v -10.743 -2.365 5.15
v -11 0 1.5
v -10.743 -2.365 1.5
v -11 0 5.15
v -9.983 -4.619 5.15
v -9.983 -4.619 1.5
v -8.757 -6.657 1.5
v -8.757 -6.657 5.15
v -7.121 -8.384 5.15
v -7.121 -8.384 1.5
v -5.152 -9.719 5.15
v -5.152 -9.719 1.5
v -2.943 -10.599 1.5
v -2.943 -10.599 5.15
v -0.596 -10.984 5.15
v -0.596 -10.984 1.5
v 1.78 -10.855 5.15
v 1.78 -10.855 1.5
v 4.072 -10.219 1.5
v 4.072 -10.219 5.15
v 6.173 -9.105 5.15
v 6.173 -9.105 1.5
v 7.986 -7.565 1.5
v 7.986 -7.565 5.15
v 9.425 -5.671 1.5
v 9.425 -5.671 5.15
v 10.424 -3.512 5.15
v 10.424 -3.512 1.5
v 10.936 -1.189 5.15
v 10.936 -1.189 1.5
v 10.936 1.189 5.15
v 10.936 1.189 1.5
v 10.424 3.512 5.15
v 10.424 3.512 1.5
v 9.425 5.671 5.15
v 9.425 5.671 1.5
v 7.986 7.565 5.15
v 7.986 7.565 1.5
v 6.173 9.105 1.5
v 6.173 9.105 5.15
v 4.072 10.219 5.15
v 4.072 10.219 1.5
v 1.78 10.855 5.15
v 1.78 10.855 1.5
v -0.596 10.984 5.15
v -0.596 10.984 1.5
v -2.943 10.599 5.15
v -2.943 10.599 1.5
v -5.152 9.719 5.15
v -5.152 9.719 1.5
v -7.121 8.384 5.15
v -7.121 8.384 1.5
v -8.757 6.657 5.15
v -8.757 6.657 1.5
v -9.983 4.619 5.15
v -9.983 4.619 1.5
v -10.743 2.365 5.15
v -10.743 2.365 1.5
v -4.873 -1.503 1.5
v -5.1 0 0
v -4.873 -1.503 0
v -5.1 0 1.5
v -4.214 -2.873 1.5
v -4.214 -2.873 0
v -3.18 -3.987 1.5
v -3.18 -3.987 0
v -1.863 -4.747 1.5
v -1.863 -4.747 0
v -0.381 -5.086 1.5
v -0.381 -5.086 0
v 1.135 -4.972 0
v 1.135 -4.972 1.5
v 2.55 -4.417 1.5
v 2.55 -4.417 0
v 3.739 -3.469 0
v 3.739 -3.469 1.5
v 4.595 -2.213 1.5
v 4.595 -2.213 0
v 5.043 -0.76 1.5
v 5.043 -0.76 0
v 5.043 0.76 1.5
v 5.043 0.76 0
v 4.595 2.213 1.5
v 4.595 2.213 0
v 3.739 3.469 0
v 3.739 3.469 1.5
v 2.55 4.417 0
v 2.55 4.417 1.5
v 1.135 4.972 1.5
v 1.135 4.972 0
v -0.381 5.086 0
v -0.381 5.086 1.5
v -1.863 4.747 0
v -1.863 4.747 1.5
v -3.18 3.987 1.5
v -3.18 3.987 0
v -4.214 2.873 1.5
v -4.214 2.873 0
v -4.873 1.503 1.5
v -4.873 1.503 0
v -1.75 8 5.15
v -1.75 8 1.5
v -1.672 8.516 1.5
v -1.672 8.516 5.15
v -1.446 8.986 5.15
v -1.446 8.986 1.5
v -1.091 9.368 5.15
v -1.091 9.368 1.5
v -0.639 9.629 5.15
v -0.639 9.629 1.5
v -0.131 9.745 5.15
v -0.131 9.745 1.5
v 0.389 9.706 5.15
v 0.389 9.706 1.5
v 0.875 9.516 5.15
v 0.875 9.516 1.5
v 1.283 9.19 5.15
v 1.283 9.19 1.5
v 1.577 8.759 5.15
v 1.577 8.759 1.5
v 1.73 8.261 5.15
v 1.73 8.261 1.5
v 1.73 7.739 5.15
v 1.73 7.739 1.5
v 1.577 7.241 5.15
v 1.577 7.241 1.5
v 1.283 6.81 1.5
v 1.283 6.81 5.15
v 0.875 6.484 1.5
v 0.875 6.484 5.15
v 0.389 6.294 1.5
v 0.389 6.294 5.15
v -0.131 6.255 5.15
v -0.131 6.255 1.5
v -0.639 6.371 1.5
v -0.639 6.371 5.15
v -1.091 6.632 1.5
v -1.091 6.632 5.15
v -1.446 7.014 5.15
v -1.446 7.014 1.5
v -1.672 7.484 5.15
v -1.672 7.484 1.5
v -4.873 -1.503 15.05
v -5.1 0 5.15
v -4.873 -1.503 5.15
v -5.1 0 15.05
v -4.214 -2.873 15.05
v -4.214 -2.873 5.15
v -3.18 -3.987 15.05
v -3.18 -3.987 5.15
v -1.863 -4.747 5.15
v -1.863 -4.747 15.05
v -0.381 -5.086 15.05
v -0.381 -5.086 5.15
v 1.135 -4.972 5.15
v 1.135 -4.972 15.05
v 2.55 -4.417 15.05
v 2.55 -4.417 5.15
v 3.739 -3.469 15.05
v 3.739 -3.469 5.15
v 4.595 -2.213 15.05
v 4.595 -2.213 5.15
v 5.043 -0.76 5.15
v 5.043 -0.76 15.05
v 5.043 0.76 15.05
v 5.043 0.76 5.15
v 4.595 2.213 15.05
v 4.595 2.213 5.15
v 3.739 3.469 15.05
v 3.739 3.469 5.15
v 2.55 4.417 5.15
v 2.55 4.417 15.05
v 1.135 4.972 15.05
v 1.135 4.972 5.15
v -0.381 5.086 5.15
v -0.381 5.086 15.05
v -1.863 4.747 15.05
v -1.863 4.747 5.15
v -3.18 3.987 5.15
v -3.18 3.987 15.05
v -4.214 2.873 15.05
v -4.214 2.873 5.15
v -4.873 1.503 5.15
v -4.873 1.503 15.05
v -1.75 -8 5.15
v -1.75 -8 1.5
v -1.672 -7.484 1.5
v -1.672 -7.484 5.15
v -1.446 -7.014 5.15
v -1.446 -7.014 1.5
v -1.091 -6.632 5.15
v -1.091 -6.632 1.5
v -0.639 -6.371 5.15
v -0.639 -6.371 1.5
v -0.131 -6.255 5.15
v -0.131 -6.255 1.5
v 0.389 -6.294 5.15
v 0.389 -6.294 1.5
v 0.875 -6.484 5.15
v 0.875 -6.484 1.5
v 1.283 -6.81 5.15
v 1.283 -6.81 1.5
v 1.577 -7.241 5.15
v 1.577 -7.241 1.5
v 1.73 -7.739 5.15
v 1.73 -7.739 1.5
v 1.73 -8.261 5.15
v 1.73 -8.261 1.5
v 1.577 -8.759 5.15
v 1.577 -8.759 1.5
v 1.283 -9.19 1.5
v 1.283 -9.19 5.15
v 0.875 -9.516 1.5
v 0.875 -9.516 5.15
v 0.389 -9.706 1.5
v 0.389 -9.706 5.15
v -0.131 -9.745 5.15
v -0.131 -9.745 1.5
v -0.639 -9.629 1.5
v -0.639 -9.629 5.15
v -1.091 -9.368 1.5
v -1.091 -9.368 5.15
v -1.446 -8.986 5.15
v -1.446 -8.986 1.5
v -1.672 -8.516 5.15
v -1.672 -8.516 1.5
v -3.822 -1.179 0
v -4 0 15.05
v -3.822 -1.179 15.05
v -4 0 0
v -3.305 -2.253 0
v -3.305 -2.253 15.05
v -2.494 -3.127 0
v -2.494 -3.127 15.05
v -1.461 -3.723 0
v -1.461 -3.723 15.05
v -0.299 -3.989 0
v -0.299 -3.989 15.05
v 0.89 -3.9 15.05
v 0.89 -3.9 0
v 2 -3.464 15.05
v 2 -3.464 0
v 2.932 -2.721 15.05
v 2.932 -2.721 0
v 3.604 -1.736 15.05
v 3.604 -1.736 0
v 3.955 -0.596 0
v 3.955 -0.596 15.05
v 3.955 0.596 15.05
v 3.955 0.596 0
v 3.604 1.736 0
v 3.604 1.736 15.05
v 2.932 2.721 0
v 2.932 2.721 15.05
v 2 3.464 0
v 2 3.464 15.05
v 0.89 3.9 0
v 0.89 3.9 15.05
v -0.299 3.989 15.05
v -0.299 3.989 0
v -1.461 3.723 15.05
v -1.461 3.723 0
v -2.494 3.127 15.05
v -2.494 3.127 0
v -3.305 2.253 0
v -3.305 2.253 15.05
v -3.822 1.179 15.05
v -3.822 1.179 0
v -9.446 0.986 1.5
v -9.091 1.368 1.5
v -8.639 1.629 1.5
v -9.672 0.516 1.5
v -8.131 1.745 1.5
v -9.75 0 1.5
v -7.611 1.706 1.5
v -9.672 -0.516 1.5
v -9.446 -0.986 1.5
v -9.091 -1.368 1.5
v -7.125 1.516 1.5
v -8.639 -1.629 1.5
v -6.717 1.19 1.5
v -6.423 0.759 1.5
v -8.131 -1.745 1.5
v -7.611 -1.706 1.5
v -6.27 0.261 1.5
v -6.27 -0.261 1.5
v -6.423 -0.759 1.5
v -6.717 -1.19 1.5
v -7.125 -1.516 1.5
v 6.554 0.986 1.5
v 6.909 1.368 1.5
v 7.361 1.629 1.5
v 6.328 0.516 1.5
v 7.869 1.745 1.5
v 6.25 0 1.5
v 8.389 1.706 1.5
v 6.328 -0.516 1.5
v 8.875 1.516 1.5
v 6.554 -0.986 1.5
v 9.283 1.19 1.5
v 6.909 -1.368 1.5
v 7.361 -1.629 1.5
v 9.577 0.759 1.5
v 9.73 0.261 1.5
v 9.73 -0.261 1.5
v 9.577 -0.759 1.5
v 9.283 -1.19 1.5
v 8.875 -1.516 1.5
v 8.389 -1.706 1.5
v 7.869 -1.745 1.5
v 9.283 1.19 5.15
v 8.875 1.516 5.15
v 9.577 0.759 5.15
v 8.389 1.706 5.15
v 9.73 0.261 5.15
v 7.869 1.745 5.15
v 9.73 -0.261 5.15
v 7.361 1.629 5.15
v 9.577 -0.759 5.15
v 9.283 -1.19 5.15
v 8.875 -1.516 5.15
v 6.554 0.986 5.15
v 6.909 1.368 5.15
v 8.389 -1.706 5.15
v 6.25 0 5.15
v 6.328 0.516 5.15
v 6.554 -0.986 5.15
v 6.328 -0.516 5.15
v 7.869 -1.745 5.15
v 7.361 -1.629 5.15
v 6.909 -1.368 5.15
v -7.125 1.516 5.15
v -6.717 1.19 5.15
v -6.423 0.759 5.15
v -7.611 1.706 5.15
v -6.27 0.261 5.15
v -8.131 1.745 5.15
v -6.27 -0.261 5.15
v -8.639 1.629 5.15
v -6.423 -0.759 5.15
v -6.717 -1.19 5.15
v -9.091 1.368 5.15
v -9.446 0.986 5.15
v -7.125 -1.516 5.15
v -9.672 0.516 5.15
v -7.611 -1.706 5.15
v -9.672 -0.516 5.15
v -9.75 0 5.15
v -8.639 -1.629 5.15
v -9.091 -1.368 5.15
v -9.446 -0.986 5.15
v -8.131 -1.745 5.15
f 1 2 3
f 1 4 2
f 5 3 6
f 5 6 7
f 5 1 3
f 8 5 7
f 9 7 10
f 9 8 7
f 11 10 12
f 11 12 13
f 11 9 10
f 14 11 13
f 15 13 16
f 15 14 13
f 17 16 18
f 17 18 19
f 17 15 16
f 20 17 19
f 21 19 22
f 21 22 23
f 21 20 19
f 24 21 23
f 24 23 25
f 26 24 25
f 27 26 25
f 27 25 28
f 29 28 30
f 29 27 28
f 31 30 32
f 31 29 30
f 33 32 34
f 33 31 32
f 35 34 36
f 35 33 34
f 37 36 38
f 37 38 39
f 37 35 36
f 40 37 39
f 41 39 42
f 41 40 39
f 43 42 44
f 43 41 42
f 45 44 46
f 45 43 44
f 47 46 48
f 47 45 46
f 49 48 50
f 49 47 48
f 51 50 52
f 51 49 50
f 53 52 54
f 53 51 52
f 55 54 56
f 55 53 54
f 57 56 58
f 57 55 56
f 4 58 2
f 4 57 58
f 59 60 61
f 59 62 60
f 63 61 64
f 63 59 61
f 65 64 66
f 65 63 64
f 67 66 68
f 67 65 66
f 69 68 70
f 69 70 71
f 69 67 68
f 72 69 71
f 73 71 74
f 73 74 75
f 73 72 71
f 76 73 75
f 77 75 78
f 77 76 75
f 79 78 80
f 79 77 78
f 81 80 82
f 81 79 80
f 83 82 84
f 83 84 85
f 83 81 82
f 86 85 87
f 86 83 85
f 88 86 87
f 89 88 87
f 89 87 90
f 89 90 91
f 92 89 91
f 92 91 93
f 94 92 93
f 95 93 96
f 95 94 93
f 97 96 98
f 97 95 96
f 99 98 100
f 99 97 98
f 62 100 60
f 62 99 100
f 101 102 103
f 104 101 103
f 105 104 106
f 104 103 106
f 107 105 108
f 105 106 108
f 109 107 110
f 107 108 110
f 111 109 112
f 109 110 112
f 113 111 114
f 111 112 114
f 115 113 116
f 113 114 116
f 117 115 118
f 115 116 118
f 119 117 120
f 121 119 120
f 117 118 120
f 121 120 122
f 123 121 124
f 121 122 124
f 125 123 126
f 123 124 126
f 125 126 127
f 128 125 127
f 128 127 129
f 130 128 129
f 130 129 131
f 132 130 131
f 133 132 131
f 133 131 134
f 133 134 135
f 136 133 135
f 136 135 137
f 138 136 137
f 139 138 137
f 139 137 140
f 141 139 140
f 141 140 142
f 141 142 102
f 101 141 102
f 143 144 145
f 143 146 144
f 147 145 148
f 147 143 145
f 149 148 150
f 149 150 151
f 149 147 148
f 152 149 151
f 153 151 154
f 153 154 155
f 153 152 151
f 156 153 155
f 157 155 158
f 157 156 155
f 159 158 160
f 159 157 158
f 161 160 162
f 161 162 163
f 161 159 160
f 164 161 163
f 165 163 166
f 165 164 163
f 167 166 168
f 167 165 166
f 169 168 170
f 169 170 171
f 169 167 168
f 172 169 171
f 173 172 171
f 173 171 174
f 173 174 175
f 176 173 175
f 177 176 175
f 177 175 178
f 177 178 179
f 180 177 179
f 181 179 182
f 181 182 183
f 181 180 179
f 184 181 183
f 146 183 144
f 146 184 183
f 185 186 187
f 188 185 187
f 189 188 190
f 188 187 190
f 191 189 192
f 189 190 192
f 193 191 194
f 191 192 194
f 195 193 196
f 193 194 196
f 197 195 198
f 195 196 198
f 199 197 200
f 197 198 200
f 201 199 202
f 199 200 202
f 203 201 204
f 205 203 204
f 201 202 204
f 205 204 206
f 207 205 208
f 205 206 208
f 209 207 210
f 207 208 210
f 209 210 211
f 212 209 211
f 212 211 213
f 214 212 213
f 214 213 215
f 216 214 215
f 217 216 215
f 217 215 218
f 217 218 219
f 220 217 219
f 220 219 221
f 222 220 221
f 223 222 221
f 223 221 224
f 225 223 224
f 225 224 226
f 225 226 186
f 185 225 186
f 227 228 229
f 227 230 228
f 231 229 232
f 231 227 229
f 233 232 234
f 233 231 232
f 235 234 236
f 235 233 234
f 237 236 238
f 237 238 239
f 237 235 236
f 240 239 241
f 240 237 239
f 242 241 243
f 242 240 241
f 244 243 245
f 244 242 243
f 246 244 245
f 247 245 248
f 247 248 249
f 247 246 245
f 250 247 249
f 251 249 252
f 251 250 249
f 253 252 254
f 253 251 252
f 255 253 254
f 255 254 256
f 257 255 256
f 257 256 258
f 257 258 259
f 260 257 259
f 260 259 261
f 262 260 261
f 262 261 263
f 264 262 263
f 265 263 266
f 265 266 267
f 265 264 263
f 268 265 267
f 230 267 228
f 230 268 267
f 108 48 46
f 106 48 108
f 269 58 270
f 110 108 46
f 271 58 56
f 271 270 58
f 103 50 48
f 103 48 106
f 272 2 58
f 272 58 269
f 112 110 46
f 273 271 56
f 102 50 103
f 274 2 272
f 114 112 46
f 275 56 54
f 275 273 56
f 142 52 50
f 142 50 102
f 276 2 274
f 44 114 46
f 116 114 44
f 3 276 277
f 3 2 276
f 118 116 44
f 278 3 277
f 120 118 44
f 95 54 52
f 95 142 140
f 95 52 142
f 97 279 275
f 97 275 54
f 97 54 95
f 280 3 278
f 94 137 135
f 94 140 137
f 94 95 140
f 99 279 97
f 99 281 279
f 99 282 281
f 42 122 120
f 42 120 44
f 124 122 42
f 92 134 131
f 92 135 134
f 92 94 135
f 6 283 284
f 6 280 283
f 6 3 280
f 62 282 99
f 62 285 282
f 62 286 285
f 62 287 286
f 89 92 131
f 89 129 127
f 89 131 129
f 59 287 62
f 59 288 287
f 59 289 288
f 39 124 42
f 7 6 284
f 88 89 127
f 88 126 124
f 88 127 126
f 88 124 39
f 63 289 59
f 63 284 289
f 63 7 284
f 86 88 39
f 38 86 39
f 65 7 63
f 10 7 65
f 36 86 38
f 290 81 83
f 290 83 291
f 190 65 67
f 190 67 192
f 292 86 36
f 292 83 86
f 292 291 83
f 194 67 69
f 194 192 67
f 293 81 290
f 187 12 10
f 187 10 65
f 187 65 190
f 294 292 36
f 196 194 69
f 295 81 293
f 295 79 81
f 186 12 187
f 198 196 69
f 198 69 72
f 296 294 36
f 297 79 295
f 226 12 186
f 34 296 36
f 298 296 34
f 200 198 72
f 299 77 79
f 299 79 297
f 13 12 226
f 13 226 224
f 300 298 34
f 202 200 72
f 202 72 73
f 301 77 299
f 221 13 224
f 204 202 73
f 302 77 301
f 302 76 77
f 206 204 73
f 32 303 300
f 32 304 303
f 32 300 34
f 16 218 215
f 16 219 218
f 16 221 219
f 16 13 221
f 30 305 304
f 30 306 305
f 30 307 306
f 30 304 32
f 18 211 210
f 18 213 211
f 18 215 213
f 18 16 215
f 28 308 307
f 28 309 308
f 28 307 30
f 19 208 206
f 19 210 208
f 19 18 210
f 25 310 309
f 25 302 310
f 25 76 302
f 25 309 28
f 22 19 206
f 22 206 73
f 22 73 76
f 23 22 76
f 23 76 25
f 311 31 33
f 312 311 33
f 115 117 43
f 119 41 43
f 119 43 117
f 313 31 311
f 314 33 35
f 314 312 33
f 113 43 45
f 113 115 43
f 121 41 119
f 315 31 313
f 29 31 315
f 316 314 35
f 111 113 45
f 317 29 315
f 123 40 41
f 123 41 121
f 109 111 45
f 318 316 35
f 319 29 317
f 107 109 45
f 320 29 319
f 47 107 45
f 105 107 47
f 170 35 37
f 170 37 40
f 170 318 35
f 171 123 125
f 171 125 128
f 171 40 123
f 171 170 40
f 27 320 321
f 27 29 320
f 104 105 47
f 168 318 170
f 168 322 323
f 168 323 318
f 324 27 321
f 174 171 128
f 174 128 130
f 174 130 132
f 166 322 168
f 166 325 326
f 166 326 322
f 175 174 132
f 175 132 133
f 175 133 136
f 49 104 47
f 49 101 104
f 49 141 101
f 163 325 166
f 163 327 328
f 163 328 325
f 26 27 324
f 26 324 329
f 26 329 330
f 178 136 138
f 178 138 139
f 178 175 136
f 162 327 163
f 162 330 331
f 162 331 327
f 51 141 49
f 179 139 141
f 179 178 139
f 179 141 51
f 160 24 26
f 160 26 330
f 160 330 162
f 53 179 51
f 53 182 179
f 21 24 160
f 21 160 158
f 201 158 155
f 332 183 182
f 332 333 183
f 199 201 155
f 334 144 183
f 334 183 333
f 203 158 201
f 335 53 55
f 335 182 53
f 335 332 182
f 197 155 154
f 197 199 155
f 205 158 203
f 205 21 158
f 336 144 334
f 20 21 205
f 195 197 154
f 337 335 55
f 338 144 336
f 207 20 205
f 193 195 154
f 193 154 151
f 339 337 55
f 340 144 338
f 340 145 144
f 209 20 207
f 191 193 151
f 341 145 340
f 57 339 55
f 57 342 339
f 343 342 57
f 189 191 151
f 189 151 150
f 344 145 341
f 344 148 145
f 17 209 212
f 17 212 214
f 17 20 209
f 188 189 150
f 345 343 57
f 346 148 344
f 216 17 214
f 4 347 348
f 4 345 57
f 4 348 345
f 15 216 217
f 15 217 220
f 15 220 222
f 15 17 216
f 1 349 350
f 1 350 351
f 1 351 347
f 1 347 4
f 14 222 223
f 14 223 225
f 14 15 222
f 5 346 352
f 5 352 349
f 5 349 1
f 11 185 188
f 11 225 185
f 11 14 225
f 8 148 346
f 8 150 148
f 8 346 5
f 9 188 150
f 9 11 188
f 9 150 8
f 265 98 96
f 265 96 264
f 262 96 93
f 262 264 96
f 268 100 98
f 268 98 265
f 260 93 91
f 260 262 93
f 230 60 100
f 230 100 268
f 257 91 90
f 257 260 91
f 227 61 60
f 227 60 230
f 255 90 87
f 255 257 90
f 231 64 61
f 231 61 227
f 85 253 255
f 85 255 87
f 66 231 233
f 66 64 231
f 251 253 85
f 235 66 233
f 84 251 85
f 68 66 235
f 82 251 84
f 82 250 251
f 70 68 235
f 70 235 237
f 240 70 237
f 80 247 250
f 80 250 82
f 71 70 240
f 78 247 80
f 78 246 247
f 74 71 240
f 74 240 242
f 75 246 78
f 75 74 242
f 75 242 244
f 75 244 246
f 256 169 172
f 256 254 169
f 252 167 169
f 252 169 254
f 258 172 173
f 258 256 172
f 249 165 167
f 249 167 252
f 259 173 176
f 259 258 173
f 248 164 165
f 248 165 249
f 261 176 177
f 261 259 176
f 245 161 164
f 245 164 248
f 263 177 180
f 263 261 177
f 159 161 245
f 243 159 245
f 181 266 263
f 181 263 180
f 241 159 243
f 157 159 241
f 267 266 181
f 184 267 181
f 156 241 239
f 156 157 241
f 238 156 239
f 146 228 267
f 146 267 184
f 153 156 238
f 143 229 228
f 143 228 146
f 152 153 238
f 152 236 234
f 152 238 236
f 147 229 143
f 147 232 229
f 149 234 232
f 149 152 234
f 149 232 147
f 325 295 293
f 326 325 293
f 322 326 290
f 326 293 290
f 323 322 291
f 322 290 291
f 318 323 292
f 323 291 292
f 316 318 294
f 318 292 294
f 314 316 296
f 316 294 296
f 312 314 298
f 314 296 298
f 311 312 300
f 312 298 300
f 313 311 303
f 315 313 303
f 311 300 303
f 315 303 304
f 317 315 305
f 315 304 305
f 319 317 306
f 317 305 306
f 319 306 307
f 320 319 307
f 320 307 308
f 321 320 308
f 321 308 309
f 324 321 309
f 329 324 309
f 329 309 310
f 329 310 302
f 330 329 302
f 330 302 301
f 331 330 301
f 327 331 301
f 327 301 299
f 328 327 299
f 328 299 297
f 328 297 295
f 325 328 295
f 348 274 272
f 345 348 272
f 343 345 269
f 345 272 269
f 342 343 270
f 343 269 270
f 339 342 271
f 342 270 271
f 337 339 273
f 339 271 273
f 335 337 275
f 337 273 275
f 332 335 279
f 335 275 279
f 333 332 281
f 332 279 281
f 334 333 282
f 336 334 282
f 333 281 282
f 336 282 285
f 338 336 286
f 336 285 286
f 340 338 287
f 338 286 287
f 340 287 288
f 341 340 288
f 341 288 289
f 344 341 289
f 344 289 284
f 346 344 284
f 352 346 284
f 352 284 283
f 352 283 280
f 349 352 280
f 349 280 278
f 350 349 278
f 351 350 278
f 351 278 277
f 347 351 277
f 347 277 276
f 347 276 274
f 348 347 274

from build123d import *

# Parameters (mm, degrees)
F_3_5_3_5_DIAMETER_HOLE1_D = 3.5


with BuildPart() as part:
    # Sketch1 → Revolve1 (revolve)
    with BuildSketch(Plane(origin=(0, 0, 0), x_dir=(1, 0, 0), z_dir=(0, 1, 0)), mode=Mode.PRIVATE) as revolve1_sk:
        Polygon((11, -1.5), (11, -5.15), (5.1, -5.15), (5.1, -15.05), (4, -15.05), (4, 0), (5.1, 0), (5.1, -1.5), align=None)
    revolve(revolve1_sk.sketch.rotate(Axis((0, 0, 0), (0, 0, 1)), 180), axis=Axis((0, 0, 0), (0, 0, 1)))

    # Ø3.5 (3.5) Diameter Hole1 (through all)
    with Locations(Plane.XY.offset(5.15)):
        with Locations((-8, 0), (0, 8), (8, 0), (0, -8)):
            Hole(F_3_5_3_5_DIAMETER_HOLE1_D / 2)


solid = part.part
